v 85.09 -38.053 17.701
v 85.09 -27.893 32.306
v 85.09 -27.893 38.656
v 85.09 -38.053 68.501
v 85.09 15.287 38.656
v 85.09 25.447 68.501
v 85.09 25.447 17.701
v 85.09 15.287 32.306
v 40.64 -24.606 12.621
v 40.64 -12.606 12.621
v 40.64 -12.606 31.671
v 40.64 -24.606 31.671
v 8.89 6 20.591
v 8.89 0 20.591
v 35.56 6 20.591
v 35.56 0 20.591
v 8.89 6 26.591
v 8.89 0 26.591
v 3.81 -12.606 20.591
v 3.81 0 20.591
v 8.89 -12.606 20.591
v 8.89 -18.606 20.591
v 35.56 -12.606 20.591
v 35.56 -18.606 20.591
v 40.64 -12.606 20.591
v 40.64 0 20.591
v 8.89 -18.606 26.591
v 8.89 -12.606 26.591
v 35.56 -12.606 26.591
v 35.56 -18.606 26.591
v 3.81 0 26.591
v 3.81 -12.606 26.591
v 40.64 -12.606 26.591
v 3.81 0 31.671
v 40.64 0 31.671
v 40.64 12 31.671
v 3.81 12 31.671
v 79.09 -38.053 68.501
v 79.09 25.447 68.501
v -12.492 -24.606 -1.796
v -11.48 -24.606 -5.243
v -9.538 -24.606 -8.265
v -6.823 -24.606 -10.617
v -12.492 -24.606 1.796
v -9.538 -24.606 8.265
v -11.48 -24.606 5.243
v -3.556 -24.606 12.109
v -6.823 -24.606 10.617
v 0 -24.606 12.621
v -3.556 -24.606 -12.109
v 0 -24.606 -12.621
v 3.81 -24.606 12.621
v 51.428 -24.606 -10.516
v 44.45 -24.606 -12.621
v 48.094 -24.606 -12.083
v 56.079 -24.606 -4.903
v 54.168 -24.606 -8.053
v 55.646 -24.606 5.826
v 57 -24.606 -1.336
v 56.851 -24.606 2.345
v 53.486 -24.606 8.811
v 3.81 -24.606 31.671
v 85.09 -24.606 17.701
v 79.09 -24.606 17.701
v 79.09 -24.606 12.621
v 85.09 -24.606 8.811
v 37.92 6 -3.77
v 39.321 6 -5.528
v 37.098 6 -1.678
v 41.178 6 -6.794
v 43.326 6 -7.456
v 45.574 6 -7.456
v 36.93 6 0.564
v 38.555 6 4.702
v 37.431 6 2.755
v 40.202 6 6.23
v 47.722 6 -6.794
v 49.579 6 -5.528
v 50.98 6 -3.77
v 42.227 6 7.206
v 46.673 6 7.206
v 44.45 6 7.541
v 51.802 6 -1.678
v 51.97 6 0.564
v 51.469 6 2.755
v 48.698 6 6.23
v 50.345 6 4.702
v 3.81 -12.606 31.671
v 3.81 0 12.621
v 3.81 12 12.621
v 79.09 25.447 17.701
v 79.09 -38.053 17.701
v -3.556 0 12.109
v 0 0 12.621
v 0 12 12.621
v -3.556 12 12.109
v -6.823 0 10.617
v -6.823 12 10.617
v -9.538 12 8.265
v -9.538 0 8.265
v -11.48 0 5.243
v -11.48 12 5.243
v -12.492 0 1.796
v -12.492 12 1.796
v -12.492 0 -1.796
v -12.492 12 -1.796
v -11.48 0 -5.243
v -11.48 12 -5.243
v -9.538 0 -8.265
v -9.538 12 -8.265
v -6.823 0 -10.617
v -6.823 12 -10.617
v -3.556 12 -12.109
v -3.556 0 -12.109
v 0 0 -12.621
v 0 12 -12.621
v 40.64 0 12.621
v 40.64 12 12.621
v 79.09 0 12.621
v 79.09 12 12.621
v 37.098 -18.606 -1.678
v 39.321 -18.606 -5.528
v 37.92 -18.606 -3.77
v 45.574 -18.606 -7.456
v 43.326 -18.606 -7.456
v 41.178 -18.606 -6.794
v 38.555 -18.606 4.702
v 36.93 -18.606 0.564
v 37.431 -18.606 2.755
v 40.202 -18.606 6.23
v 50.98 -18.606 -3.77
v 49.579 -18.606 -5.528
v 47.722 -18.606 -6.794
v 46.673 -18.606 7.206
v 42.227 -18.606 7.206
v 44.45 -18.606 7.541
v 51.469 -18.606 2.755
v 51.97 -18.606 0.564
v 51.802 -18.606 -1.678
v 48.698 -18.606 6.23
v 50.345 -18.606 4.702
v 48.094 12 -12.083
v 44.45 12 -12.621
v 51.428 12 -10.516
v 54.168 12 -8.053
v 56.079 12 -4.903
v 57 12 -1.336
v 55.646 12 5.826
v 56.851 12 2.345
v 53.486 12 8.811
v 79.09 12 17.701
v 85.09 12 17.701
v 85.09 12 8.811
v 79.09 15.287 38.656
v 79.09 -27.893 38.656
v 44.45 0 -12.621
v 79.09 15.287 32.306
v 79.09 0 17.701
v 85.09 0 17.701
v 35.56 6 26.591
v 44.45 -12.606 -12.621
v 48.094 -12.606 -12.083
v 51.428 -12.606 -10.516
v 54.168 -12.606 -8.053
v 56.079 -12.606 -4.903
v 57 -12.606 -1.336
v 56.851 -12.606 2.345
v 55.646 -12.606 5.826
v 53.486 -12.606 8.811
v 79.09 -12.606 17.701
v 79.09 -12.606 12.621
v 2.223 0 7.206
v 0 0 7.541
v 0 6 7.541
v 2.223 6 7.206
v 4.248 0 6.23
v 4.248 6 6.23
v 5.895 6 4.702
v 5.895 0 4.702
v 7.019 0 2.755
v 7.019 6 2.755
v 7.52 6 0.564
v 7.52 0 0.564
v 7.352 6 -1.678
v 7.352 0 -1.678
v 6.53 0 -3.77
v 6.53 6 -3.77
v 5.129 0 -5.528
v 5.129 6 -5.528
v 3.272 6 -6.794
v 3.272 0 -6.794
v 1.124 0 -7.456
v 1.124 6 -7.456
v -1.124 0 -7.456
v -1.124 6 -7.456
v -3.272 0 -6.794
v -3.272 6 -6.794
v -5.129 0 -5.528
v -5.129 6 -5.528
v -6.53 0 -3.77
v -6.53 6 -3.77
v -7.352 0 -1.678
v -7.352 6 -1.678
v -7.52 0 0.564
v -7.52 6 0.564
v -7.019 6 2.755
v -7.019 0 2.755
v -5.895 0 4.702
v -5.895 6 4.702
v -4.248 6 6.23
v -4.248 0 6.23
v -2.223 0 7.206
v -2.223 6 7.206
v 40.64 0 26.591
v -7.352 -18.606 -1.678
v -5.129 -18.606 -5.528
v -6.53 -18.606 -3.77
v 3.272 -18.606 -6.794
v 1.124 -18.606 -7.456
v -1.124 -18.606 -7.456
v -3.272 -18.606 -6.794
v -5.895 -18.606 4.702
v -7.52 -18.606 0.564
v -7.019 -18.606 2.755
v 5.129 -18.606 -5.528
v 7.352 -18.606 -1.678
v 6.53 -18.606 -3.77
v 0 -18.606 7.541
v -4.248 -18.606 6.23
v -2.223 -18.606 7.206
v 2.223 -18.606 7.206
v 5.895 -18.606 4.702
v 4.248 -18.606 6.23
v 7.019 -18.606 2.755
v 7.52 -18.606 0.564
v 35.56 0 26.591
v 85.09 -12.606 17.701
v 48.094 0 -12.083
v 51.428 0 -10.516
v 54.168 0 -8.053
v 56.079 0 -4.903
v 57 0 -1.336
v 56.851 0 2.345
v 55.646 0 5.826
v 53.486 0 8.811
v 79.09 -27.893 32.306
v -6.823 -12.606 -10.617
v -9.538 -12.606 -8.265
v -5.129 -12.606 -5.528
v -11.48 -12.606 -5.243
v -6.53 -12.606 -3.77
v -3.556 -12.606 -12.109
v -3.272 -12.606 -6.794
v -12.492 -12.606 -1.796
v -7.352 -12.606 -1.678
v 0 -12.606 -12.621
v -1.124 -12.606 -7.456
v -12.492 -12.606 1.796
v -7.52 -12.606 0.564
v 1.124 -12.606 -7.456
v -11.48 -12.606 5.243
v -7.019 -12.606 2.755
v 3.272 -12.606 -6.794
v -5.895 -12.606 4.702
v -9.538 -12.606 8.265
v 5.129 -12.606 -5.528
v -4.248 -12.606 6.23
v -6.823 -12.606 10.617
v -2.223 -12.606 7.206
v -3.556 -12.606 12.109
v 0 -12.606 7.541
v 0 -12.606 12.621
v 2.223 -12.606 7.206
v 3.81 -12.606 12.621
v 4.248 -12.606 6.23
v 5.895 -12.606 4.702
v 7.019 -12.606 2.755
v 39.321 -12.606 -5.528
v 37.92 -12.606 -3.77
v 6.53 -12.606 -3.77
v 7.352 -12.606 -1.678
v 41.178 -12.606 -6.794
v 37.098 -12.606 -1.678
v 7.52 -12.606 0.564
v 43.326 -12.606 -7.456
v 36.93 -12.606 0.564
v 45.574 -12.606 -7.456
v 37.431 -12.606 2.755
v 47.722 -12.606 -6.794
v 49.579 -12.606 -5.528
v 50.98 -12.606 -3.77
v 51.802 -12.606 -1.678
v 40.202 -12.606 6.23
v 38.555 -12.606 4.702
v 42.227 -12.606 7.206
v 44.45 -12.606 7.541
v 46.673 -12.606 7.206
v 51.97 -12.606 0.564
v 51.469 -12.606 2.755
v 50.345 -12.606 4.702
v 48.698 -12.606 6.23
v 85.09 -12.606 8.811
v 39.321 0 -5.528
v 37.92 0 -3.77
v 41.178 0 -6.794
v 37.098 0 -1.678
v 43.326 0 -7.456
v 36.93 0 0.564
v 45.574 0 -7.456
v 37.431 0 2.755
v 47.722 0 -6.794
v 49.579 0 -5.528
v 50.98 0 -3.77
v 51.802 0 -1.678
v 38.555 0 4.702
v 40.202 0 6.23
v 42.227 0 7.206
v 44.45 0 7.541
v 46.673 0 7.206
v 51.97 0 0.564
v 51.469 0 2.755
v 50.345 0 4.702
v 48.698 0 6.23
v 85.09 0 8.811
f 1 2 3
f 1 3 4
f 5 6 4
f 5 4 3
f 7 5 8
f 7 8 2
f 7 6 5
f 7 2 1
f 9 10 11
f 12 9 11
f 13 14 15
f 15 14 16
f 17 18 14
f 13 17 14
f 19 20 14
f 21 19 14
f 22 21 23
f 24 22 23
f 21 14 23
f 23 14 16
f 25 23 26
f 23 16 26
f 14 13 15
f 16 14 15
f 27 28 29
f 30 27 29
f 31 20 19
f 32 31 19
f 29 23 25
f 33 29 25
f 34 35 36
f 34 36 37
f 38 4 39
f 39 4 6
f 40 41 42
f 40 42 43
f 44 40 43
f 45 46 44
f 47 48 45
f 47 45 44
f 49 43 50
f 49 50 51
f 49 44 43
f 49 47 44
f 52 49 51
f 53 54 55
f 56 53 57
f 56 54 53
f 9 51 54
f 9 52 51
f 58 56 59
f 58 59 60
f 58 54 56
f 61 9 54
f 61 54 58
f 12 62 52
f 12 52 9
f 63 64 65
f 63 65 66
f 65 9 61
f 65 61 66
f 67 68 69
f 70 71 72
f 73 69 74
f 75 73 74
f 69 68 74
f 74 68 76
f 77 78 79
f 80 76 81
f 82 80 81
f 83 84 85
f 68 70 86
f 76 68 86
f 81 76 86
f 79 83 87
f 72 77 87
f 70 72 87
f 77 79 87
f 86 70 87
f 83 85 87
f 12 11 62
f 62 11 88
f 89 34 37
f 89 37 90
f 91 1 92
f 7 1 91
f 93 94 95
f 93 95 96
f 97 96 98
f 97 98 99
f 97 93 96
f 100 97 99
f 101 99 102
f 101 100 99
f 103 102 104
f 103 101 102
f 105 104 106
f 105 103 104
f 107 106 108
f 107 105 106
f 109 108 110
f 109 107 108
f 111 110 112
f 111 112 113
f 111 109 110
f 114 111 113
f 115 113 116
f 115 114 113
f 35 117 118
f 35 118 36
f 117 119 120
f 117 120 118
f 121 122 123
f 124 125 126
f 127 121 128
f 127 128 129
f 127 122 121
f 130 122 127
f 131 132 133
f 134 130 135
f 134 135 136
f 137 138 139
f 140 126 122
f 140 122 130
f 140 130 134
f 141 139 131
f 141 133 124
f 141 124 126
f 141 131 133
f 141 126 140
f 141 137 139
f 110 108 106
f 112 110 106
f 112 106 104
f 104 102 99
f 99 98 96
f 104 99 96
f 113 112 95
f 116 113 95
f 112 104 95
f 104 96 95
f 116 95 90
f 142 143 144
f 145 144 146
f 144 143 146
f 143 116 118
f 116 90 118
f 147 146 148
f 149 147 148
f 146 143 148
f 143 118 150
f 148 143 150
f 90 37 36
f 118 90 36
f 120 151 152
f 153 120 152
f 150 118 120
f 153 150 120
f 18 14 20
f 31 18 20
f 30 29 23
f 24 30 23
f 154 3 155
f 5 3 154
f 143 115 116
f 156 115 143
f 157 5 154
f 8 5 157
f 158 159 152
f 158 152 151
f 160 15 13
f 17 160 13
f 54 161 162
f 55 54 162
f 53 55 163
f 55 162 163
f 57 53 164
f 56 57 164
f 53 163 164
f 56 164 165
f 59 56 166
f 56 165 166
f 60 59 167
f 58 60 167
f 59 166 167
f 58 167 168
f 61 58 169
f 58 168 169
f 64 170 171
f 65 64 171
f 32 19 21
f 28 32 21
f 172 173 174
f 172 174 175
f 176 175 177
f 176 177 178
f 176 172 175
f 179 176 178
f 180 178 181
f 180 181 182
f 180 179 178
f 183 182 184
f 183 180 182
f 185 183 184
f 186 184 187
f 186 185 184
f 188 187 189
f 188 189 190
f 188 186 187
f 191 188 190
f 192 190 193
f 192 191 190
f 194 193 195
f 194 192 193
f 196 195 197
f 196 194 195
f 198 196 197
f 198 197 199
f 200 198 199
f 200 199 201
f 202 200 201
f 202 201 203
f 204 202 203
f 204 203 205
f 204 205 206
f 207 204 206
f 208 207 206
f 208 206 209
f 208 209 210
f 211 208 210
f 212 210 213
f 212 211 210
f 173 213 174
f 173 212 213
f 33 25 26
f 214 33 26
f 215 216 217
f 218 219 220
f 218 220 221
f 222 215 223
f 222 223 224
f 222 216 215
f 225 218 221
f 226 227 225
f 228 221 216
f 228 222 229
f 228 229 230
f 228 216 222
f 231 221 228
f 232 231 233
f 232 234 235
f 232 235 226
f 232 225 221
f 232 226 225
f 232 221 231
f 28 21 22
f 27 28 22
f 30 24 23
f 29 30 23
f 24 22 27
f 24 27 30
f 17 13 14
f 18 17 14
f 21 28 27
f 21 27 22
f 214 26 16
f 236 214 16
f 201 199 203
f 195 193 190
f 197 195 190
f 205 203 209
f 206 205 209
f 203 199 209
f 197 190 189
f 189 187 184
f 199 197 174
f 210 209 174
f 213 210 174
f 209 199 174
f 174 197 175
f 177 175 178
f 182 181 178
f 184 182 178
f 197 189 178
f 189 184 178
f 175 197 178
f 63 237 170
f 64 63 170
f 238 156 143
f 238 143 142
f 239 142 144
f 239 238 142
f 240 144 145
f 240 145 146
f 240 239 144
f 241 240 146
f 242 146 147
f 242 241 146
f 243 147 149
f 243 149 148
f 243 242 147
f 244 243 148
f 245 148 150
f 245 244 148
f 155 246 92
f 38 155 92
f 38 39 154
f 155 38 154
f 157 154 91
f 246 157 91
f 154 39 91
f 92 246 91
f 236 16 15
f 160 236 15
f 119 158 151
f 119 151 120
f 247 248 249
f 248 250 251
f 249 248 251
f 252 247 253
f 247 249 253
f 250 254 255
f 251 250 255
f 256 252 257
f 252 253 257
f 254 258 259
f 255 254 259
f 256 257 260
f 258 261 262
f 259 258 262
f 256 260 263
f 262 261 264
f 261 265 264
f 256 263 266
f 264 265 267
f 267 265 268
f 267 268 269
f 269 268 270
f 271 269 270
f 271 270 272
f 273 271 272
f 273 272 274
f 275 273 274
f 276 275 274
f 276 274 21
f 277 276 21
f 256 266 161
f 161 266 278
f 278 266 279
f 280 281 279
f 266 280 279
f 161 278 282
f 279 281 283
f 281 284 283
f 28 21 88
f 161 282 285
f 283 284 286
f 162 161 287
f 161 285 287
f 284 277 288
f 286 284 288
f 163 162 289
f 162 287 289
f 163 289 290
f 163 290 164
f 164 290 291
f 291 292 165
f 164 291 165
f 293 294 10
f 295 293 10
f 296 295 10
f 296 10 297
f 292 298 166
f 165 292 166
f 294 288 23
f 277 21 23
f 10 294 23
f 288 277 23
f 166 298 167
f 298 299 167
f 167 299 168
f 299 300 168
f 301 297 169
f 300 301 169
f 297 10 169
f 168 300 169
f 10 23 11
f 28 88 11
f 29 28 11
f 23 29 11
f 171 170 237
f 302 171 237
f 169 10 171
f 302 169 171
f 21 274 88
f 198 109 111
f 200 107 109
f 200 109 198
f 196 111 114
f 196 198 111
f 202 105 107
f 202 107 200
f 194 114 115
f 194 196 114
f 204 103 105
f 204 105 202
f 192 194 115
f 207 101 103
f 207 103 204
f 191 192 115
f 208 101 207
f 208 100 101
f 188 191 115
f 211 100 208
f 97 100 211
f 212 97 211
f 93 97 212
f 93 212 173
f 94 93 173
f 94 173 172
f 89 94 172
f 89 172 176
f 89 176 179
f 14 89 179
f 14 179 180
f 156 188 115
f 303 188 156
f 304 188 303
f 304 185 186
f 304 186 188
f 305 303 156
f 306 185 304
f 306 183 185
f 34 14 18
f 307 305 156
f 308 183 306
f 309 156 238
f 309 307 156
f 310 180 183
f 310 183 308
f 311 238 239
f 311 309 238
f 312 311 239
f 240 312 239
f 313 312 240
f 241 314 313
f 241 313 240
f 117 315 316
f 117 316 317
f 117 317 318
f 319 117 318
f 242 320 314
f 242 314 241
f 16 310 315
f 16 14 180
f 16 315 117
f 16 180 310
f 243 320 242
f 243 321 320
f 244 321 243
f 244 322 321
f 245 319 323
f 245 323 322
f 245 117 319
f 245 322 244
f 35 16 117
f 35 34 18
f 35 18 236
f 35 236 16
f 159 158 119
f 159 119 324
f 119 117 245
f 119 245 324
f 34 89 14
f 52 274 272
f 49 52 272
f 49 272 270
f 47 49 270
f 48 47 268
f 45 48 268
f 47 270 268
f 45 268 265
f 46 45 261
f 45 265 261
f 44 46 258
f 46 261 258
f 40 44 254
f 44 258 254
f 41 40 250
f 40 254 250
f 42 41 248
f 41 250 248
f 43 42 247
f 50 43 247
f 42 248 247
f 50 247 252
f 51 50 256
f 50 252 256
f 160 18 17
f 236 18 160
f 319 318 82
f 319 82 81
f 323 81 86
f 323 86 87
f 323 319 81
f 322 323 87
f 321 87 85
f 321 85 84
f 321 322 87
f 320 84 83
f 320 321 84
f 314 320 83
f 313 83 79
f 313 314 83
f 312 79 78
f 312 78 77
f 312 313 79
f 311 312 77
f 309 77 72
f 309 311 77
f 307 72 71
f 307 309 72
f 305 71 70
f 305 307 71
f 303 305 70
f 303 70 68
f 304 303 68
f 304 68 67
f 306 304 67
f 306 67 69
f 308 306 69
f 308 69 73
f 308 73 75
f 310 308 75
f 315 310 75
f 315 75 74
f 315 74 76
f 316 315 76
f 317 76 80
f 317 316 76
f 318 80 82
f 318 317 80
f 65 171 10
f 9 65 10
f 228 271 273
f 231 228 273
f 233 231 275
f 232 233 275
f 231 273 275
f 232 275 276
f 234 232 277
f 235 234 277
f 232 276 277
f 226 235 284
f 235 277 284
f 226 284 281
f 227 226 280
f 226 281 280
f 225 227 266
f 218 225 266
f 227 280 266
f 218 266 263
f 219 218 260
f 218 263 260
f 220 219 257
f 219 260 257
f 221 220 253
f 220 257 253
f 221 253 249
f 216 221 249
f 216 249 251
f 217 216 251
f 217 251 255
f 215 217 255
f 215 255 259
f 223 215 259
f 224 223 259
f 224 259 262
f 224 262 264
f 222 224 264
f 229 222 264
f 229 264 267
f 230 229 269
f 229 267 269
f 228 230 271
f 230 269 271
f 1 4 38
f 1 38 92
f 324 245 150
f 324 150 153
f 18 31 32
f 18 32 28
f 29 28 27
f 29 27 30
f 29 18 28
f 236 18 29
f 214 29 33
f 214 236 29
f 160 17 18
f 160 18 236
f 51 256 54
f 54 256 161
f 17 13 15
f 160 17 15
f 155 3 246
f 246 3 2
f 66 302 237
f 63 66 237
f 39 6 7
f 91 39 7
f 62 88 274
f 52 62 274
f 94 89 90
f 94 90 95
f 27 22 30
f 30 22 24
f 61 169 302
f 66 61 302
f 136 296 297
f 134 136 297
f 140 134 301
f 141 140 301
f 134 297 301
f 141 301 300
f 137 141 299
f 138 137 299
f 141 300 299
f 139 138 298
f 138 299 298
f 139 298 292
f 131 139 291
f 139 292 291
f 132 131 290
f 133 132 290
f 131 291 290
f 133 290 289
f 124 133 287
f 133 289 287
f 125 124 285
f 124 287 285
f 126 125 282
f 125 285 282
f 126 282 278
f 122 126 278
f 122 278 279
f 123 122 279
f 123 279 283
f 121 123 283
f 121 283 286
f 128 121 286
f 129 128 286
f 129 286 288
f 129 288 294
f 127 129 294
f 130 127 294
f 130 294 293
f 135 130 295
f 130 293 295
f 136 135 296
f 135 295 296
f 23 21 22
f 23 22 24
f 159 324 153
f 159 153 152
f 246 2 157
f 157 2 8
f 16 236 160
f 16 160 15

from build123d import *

# Parameters (mm, degrees)
BOSS_EXTRUDE1_DEPTH = 12
SKETCH1_3_R         = 7.540625
SKETCH1_3_W         = 26.67
SKETCH1_3_H         = 6
CUT_EXTRUDE1_DEPTH  = 6
BOSS_EXTRUDE3_DEPTH = 12
BOSS_EXTRUDE2_DEPTH = 6
SKETCH4_W           = 50.8
SKETCH4_H           = 63.5
SKETCH4_W_2         = 6.35
SKETCH4_H_2         = 43.18
BOSS_EXTRUDE4_DEPTH = 6


with BuildPart() as part:
    # Sketch1 → Boss-Extrude1 (new body)
    with BuildSketch(Plane(origin=(0, 0, 0), x_dir=(1, 0, 0), z_dir=(0, 1, 0))):
        with BuildLine():
            Line((0, 12.620625), (44.45, 12.620625))
            ThreePointArc((44.45, 12.620625), (57.070625, 0), (44.45, -12.620625))
            Line((44.45, -12.620625), (40.64, -12.620625))
            Line((40.64, -12.620625), (40.64, -31.670625))
            Line((40.64, -31.670625), (3.81, -31.670625))
            Line((3.81, -31.670625), (3.81, -12.620625))
            Line((3.81, -12.620625), (0, -12.620625))
            ThreePointArc((0, -12.620625), (-12.620625, 0), (0, 12.620625))
        make_face()
    extrude(amount=BOSS_EXTRUDE1_DEPTH)

    # Sketch1<3> → Cut-Extrude1 (cut)
    with BuildSketch(Plane(origin=(0, 0, 0), x_dir=(1, 0, 0), z_dir=(0, 1, 0))):
        with Locations(Location((0, 0, 0), (0, 0, 270))):
            Circle(SKETCH1_3_R)
        with Locations(Location((44.45, 0, 0), (0, 0, 270))):
            Circle(SKETCH1_3_R)
        with Locations((22.225, -23.590625)):
            Rectangle(SKETCH1_3_W, SKETCH1_3_H)
    extrude(amount=CUT_EXTRUDE1_DEPTH, mode=Mode.SUBTRACT)

    # Sketch3 → Boss-Extrude3 (add)
    with BuildSketch(Plane.XZ):
        Polygon((85.09, 12.620625), (85.09, 17.700625), (79.09, 17.700625), (79.09, 12.620625), (40.64, 12.620625), (40.64, 8.810625), (85.09, 8.810625), align=None)
    extrude(amount=-BOSS_EXTRUDE3_DEPTH)


with BuildPart() as body_2:
    # Mirror1: mirrored copy
    add(part.part.mirror(Plane(origin=(0, -6.303125062, 0), x_dir=(0, 0, 1), z_dir=(0, -1, 0))))


with BuildPart() as body_3:
    # Sketch2 → Boss-Extrude2 (new body)
    with BuildSketch(Plane.XY.offset(20.590625)):
        Polygon((8.89, -12.606250124), (8.89, -18.606250124), (35.56, -18.606250124), (35.56, -12.606250124), (40.64, -12.606250124), (40.64, 0), (35.56, 0), (35.56, 6), (8.89, 6), (8.89, 0), (3.81, 0), (3.81, -12.606250124), align=None)
    extrude(amount=BOSS_EXTRUDE2_DEPTH)


with BuildPart() as body_4:
    # Sketch4 → Boss-Extrude4 (new body)
    with BuildSketch(Plane(origin=(85.09, 0, 0), x_dir=(0, 0, -1), z_dir=(1, 0, 0))):
        with Locations((-43.100625, -6.303125062)):
            Rectangle(SKETCH4_W, SKETCH4_H)
        with Locations((-35.480625, -6.303125062)):
            Rectangle(SKETCH4_W_2, SKETCH4_H_2, mode=Mode.SUBTRACT)
    extrude(amount=-BOSS_EXTRUDE4_DEPTH)


solid = Compound([part.part, body_2.part, body_3.part, body_4.part])
